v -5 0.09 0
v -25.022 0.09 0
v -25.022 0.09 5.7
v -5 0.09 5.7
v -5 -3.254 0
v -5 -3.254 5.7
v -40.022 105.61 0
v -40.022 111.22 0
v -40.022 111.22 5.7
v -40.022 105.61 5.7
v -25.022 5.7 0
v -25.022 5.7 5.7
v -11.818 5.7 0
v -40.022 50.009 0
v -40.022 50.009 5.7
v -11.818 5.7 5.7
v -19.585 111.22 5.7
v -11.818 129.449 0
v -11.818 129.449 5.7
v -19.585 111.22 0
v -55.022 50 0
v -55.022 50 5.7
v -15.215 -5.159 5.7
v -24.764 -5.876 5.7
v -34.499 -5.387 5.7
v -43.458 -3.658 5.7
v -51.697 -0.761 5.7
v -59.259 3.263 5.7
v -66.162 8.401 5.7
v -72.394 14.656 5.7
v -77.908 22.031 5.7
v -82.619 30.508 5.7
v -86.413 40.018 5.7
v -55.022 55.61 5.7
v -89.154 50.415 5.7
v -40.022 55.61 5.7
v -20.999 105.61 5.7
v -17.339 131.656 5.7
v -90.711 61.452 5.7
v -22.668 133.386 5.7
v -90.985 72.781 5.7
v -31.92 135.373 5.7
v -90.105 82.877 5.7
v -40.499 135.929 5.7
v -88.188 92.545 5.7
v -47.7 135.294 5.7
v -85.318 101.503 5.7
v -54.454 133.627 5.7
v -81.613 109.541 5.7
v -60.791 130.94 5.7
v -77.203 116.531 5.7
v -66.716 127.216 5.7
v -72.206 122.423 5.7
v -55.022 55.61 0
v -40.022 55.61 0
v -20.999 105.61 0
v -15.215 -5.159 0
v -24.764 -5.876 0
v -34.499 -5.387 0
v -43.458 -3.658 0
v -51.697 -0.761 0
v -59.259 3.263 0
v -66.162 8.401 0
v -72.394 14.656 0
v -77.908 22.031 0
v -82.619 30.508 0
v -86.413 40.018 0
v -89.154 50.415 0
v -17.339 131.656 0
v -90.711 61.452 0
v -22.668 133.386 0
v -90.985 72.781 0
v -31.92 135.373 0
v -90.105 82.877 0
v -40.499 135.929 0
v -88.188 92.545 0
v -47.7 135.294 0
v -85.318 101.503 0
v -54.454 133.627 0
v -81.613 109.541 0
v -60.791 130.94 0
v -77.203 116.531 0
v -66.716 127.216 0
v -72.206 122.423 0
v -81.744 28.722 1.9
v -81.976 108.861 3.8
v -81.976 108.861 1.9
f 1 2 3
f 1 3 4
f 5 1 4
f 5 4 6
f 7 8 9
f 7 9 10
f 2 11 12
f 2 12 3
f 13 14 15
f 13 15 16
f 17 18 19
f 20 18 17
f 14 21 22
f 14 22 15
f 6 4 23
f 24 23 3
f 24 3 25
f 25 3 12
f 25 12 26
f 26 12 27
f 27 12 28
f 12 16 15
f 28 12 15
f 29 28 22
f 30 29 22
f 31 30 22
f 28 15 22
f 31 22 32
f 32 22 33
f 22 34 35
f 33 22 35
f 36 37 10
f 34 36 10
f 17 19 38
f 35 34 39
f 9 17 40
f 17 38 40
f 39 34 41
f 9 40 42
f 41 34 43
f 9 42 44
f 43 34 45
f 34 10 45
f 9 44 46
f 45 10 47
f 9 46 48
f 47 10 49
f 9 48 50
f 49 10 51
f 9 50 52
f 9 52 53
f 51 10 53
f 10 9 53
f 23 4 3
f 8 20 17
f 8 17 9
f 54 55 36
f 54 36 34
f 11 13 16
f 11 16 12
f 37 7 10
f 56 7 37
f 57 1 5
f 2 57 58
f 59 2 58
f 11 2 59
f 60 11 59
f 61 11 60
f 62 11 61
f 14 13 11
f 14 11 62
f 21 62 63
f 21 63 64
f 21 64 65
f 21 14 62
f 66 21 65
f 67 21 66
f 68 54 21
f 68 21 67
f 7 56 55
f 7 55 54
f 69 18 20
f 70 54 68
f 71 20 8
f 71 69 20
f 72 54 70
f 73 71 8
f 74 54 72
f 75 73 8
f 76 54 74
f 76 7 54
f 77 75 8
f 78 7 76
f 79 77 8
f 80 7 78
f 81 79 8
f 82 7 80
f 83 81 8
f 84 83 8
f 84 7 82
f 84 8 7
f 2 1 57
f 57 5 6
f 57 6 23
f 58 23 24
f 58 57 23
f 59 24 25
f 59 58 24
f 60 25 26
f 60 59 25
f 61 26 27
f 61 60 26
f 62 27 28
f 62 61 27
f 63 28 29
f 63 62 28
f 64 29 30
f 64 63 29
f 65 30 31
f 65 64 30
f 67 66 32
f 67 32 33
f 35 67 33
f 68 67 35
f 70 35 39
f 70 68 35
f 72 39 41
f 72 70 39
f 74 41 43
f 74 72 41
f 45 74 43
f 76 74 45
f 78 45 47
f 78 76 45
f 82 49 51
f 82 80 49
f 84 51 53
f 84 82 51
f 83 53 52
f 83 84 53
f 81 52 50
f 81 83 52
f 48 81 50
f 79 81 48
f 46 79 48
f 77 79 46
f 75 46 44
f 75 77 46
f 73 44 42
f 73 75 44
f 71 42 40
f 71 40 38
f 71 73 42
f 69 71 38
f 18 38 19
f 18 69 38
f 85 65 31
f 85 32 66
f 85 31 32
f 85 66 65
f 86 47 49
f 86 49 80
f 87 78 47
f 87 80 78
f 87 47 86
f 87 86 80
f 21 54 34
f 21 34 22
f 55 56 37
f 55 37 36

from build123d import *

# Parameters (mm, degrees)
ESTRUSIONE_ESTRUSIONE1_DEPTH = 5.7


with BuildPart() as part:
    # Model → Estrusione-Estrusione1 (new body)
    with BuildSketch(Plane.XY):
        with BuildLine():
            Line((-5, 0.09), (-5, -3.254122143))
            add(Edge.make_bspline(
                [(-5, -3.254122143), (-122.039878304, -31.264583812), (-115.130671173, 174.542277049), (-11.818324795, 129.448781979)],
                knots=[0, 0, 0, 0, 1, 1, 1, 1], degree=3))
            Line((-11.818324795, 129.448781979), (-19.584652517, 111.22))
            Line((-19.584652517, 111.22), (-40.0225, 111.22))
            Line((-40.0225, 111.22), (-40.0225, 105.61))
            Line((-40.0225, 105.61), (-20.998922906, 105.61))
            Line((-20.998922906, 105.61), (-40.0225, 55.61))
            Line((-40.0225, 55.61), (-55.0225, 55.61))
            Line((-55.0225, 55.61), (-55.0225, 50))
            Line((-55.0225, 50), (-40.0225, 50.008559229))
            Line((-40.0225, 50.008559229), (-11.818324795, 5.7))
            Line((-11.818324795, 5.7), (-25.0225, 5.7))
            Line((-25.0225, 5.7), (-25.0225, 0.09))
            Line((-25.0225, 0.09), (-5, 0.09))
        make_face()
    extrude(amount=ESTRUSIONE_ESTRUSIONE1_DEPTH)


solid = part.part
